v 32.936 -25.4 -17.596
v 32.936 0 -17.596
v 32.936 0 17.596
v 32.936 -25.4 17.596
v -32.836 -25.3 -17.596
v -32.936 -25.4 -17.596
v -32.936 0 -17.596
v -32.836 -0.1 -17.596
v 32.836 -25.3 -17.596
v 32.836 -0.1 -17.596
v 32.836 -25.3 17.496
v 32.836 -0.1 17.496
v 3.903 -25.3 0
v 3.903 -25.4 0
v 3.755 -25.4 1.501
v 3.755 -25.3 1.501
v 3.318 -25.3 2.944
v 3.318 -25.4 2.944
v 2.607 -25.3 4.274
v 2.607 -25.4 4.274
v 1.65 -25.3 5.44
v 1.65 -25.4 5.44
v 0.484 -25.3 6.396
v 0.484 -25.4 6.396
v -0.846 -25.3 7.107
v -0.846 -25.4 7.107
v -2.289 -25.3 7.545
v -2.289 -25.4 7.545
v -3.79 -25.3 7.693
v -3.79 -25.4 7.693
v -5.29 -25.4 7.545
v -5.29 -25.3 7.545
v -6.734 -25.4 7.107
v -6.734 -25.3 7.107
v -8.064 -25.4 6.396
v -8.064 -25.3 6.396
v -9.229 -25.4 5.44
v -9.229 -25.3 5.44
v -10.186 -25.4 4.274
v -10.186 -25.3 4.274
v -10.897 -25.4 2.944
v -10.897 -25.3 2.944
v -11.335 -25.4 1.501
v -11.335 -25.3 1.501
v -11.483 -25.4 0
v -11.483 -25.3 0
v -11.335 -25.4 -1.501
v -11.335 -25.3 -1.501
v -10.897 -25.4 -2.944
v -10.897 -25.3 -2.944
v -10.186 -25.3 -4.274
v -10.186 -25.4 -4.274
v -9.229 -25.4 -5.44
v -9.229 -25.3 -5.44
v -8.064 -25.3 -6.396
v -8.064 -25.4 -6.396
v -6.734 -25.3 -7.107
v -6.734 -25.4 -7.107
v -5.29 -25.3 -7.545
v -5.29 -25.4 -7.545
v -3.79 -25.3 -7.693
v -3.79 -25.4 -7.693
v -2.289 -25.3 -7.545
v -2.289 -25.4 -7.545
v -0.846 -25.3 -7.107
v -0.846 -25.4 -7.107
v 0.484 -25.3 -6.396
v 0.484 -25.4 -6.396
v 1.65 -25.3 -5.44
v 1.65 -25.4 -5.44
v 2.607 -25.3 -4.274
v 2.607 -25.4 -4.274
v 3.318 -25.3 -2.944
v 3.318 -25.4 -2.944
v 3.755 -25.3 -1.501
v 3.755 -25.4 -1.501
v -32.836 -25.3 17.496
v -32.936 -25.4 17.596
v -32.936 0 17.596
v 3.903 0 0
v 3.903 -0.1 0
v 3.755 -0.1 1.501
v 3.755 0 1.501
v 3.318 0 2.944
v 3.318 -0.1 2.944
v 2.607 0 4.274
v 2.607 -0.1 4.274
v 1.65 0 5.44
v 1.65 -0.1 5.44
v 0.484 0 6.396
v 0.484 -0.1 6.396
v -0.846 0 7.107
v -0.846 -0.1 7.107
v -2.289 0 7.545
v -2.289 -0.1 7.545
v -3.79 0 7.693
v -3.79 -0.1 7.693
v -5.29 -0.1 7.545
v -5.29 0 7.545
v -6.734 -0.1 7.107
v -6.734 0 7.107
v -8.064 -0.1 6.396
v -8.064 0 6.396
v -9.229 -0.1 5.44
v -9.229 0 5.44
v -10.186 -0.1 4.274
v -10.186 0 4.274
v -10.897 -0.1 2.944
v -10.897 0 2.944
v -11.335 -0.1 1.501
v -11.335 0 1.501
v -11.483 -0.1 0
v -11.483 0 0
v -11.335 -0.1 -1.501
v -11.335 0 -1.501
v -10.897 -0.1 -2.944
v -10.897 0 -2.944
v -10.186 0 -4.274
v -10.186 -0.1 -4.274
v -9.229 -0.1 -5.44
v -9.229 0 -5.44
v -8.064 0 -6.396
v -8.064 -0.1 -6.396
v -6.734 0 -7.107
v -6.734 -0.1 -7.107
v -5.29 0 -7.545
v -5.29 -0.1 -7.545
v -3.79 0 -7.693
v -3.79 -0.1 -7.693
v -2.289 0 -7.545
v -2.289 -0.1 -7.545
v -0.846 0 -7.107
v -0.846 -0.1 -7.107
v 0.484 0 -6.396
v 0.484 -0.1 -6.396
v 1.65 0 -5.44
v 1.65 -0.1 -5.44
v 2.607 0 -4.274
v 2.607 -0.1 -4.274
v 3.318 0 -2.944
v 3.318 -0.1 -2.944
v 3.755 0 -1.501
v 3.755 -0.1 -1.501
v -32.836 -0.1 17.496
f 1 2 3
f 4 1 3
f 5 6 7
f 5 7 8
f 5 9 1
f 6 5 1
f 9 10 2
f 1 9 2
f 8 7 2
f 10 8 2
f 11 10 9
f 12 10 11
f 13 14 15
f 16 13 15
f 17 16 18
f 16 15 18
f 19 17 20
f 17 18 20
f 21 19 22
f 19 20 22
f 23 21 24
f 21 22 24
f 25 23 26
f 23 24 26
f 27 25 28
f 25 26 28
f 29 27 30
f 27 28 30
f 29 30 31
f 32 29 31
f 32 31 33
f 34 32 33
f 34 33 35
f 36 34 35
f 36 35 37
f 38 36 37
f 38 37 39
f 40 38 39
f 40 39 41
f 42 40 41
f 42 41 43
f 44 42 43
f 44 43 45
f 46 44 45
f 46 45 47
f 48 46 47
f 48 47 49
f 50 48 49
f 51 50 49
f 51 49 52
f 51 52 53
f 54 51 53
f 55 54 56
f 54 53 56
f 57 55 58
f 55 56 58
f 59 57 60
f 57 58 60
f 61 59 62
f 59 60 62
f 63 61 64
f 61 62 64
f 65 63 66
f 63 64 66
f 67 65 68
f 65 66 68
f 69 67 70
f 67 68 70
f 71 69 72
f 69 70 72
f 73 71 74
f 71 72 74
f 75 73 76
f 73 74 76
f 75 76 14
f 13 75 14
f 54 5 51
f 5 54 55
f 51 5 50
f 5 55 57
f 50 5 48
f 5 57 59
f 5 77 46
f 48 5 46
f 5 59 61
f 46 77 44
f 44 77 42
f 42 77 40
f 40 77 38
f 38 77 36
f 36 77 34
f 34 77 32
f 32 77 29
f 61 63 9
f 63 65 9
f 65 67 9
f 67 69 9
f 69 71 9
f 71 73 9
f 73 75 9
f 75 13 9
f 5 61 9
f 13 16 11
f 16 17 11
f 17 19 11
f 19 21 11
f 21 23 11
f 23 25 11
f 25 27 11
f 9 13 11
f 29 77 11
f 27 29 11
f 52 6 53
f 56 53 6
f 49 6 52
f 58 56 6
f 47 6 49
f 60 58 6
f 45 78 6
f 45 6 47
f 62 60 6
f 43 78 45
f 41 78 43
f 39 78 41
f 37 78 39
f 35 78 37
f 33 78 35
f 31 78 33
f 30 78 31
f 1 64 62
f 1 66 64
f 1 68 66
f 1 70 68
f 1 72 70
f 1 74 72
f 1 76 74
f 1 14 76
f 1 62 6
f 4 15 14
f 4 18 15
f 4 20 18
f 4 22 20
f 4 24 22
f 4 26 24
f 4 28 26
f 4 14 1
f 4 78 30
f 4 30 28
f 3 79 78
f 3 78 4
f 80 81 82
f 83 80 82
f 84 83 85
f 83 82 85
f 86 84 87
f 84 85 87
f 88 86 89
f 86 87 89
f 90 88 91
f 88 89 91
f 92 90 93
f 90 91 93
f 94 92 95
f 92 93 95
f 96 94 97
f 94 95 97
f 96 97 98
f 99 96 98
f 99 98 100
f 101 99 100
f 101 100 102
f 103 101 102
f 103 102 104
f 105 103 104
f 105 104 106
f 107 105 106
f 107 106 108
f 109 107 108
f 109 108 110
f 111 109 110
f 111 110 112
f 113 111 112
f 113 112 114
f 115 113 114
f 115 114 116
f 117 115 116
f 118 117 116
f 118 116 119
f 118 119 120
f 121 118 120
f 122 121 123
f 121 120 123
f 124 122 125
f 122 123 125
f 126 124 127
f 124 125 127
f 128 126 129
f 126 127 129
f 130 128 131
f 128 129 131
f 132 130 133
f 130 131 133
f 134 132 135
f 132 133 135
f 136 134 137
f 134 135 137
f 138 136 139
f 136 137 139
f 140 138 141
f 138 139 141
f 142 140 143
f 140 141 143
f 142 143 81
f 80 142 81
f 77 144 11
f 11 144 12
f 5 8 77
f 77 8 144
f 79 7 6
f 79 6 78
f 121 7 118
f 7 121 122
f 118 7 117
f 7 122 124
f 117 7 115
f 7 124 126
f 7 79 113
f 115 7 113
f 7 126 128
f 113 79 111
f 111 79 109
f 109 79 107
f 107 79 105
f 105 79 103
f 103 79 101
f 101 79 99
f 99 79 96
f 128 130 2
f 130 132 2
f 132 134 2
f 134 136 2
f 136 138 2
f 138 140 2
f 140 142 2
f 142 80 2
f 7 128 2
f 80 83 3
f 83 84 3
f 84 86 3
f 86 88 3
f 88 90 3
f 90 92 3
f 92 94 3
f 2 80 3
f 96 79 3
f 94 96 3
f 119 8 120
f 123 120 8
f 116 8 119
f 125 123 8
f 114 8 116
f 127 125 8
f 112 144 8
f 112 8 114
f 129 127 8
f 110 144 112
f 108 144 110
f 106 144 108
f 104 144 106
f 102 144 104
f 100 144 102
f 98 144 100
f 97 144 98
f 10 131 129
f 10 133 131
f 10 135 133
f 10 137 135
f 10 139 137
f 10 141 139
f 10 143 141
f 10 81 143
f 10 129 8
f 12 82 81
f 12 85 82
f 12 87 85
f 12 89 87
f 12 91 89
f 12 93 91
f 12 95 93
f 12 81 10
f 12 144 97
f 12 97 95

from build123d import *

# Parameters (mm, degrees)
F0_W     = 65.872892
F0_H     = 35.192366
F1_DEPTH = 25.4
F2_T     = -0.1
F3_R     = 7.692897
F4_DEPTH = 42.926


with BuildPart() as f1:
    # F0 (on Front) → F1 (new body)
    with BuildSketch(Plane.XZ):
        Rectangle(F0_W, F0_H)
    extrude(amount=F1_DEPTH)

    # F2
    f2_openings = [f1.faces().sort_by_distance(p)[0] for p in [
        (0, -12.7, -17.596183),
    ]]
    offset(amount=F2_T, openings=f2_openings)

    # F3 (on face) → F4 (cut)
    with BuildSketch(Plane.XZ.offset(25.4)):
        with Locations((-3.789655, 0)):
            Circle(F3_R)
    extrude(amount=-F4_DEPTH, mode=Mode.SUBTRACT)


solid = f1.part
